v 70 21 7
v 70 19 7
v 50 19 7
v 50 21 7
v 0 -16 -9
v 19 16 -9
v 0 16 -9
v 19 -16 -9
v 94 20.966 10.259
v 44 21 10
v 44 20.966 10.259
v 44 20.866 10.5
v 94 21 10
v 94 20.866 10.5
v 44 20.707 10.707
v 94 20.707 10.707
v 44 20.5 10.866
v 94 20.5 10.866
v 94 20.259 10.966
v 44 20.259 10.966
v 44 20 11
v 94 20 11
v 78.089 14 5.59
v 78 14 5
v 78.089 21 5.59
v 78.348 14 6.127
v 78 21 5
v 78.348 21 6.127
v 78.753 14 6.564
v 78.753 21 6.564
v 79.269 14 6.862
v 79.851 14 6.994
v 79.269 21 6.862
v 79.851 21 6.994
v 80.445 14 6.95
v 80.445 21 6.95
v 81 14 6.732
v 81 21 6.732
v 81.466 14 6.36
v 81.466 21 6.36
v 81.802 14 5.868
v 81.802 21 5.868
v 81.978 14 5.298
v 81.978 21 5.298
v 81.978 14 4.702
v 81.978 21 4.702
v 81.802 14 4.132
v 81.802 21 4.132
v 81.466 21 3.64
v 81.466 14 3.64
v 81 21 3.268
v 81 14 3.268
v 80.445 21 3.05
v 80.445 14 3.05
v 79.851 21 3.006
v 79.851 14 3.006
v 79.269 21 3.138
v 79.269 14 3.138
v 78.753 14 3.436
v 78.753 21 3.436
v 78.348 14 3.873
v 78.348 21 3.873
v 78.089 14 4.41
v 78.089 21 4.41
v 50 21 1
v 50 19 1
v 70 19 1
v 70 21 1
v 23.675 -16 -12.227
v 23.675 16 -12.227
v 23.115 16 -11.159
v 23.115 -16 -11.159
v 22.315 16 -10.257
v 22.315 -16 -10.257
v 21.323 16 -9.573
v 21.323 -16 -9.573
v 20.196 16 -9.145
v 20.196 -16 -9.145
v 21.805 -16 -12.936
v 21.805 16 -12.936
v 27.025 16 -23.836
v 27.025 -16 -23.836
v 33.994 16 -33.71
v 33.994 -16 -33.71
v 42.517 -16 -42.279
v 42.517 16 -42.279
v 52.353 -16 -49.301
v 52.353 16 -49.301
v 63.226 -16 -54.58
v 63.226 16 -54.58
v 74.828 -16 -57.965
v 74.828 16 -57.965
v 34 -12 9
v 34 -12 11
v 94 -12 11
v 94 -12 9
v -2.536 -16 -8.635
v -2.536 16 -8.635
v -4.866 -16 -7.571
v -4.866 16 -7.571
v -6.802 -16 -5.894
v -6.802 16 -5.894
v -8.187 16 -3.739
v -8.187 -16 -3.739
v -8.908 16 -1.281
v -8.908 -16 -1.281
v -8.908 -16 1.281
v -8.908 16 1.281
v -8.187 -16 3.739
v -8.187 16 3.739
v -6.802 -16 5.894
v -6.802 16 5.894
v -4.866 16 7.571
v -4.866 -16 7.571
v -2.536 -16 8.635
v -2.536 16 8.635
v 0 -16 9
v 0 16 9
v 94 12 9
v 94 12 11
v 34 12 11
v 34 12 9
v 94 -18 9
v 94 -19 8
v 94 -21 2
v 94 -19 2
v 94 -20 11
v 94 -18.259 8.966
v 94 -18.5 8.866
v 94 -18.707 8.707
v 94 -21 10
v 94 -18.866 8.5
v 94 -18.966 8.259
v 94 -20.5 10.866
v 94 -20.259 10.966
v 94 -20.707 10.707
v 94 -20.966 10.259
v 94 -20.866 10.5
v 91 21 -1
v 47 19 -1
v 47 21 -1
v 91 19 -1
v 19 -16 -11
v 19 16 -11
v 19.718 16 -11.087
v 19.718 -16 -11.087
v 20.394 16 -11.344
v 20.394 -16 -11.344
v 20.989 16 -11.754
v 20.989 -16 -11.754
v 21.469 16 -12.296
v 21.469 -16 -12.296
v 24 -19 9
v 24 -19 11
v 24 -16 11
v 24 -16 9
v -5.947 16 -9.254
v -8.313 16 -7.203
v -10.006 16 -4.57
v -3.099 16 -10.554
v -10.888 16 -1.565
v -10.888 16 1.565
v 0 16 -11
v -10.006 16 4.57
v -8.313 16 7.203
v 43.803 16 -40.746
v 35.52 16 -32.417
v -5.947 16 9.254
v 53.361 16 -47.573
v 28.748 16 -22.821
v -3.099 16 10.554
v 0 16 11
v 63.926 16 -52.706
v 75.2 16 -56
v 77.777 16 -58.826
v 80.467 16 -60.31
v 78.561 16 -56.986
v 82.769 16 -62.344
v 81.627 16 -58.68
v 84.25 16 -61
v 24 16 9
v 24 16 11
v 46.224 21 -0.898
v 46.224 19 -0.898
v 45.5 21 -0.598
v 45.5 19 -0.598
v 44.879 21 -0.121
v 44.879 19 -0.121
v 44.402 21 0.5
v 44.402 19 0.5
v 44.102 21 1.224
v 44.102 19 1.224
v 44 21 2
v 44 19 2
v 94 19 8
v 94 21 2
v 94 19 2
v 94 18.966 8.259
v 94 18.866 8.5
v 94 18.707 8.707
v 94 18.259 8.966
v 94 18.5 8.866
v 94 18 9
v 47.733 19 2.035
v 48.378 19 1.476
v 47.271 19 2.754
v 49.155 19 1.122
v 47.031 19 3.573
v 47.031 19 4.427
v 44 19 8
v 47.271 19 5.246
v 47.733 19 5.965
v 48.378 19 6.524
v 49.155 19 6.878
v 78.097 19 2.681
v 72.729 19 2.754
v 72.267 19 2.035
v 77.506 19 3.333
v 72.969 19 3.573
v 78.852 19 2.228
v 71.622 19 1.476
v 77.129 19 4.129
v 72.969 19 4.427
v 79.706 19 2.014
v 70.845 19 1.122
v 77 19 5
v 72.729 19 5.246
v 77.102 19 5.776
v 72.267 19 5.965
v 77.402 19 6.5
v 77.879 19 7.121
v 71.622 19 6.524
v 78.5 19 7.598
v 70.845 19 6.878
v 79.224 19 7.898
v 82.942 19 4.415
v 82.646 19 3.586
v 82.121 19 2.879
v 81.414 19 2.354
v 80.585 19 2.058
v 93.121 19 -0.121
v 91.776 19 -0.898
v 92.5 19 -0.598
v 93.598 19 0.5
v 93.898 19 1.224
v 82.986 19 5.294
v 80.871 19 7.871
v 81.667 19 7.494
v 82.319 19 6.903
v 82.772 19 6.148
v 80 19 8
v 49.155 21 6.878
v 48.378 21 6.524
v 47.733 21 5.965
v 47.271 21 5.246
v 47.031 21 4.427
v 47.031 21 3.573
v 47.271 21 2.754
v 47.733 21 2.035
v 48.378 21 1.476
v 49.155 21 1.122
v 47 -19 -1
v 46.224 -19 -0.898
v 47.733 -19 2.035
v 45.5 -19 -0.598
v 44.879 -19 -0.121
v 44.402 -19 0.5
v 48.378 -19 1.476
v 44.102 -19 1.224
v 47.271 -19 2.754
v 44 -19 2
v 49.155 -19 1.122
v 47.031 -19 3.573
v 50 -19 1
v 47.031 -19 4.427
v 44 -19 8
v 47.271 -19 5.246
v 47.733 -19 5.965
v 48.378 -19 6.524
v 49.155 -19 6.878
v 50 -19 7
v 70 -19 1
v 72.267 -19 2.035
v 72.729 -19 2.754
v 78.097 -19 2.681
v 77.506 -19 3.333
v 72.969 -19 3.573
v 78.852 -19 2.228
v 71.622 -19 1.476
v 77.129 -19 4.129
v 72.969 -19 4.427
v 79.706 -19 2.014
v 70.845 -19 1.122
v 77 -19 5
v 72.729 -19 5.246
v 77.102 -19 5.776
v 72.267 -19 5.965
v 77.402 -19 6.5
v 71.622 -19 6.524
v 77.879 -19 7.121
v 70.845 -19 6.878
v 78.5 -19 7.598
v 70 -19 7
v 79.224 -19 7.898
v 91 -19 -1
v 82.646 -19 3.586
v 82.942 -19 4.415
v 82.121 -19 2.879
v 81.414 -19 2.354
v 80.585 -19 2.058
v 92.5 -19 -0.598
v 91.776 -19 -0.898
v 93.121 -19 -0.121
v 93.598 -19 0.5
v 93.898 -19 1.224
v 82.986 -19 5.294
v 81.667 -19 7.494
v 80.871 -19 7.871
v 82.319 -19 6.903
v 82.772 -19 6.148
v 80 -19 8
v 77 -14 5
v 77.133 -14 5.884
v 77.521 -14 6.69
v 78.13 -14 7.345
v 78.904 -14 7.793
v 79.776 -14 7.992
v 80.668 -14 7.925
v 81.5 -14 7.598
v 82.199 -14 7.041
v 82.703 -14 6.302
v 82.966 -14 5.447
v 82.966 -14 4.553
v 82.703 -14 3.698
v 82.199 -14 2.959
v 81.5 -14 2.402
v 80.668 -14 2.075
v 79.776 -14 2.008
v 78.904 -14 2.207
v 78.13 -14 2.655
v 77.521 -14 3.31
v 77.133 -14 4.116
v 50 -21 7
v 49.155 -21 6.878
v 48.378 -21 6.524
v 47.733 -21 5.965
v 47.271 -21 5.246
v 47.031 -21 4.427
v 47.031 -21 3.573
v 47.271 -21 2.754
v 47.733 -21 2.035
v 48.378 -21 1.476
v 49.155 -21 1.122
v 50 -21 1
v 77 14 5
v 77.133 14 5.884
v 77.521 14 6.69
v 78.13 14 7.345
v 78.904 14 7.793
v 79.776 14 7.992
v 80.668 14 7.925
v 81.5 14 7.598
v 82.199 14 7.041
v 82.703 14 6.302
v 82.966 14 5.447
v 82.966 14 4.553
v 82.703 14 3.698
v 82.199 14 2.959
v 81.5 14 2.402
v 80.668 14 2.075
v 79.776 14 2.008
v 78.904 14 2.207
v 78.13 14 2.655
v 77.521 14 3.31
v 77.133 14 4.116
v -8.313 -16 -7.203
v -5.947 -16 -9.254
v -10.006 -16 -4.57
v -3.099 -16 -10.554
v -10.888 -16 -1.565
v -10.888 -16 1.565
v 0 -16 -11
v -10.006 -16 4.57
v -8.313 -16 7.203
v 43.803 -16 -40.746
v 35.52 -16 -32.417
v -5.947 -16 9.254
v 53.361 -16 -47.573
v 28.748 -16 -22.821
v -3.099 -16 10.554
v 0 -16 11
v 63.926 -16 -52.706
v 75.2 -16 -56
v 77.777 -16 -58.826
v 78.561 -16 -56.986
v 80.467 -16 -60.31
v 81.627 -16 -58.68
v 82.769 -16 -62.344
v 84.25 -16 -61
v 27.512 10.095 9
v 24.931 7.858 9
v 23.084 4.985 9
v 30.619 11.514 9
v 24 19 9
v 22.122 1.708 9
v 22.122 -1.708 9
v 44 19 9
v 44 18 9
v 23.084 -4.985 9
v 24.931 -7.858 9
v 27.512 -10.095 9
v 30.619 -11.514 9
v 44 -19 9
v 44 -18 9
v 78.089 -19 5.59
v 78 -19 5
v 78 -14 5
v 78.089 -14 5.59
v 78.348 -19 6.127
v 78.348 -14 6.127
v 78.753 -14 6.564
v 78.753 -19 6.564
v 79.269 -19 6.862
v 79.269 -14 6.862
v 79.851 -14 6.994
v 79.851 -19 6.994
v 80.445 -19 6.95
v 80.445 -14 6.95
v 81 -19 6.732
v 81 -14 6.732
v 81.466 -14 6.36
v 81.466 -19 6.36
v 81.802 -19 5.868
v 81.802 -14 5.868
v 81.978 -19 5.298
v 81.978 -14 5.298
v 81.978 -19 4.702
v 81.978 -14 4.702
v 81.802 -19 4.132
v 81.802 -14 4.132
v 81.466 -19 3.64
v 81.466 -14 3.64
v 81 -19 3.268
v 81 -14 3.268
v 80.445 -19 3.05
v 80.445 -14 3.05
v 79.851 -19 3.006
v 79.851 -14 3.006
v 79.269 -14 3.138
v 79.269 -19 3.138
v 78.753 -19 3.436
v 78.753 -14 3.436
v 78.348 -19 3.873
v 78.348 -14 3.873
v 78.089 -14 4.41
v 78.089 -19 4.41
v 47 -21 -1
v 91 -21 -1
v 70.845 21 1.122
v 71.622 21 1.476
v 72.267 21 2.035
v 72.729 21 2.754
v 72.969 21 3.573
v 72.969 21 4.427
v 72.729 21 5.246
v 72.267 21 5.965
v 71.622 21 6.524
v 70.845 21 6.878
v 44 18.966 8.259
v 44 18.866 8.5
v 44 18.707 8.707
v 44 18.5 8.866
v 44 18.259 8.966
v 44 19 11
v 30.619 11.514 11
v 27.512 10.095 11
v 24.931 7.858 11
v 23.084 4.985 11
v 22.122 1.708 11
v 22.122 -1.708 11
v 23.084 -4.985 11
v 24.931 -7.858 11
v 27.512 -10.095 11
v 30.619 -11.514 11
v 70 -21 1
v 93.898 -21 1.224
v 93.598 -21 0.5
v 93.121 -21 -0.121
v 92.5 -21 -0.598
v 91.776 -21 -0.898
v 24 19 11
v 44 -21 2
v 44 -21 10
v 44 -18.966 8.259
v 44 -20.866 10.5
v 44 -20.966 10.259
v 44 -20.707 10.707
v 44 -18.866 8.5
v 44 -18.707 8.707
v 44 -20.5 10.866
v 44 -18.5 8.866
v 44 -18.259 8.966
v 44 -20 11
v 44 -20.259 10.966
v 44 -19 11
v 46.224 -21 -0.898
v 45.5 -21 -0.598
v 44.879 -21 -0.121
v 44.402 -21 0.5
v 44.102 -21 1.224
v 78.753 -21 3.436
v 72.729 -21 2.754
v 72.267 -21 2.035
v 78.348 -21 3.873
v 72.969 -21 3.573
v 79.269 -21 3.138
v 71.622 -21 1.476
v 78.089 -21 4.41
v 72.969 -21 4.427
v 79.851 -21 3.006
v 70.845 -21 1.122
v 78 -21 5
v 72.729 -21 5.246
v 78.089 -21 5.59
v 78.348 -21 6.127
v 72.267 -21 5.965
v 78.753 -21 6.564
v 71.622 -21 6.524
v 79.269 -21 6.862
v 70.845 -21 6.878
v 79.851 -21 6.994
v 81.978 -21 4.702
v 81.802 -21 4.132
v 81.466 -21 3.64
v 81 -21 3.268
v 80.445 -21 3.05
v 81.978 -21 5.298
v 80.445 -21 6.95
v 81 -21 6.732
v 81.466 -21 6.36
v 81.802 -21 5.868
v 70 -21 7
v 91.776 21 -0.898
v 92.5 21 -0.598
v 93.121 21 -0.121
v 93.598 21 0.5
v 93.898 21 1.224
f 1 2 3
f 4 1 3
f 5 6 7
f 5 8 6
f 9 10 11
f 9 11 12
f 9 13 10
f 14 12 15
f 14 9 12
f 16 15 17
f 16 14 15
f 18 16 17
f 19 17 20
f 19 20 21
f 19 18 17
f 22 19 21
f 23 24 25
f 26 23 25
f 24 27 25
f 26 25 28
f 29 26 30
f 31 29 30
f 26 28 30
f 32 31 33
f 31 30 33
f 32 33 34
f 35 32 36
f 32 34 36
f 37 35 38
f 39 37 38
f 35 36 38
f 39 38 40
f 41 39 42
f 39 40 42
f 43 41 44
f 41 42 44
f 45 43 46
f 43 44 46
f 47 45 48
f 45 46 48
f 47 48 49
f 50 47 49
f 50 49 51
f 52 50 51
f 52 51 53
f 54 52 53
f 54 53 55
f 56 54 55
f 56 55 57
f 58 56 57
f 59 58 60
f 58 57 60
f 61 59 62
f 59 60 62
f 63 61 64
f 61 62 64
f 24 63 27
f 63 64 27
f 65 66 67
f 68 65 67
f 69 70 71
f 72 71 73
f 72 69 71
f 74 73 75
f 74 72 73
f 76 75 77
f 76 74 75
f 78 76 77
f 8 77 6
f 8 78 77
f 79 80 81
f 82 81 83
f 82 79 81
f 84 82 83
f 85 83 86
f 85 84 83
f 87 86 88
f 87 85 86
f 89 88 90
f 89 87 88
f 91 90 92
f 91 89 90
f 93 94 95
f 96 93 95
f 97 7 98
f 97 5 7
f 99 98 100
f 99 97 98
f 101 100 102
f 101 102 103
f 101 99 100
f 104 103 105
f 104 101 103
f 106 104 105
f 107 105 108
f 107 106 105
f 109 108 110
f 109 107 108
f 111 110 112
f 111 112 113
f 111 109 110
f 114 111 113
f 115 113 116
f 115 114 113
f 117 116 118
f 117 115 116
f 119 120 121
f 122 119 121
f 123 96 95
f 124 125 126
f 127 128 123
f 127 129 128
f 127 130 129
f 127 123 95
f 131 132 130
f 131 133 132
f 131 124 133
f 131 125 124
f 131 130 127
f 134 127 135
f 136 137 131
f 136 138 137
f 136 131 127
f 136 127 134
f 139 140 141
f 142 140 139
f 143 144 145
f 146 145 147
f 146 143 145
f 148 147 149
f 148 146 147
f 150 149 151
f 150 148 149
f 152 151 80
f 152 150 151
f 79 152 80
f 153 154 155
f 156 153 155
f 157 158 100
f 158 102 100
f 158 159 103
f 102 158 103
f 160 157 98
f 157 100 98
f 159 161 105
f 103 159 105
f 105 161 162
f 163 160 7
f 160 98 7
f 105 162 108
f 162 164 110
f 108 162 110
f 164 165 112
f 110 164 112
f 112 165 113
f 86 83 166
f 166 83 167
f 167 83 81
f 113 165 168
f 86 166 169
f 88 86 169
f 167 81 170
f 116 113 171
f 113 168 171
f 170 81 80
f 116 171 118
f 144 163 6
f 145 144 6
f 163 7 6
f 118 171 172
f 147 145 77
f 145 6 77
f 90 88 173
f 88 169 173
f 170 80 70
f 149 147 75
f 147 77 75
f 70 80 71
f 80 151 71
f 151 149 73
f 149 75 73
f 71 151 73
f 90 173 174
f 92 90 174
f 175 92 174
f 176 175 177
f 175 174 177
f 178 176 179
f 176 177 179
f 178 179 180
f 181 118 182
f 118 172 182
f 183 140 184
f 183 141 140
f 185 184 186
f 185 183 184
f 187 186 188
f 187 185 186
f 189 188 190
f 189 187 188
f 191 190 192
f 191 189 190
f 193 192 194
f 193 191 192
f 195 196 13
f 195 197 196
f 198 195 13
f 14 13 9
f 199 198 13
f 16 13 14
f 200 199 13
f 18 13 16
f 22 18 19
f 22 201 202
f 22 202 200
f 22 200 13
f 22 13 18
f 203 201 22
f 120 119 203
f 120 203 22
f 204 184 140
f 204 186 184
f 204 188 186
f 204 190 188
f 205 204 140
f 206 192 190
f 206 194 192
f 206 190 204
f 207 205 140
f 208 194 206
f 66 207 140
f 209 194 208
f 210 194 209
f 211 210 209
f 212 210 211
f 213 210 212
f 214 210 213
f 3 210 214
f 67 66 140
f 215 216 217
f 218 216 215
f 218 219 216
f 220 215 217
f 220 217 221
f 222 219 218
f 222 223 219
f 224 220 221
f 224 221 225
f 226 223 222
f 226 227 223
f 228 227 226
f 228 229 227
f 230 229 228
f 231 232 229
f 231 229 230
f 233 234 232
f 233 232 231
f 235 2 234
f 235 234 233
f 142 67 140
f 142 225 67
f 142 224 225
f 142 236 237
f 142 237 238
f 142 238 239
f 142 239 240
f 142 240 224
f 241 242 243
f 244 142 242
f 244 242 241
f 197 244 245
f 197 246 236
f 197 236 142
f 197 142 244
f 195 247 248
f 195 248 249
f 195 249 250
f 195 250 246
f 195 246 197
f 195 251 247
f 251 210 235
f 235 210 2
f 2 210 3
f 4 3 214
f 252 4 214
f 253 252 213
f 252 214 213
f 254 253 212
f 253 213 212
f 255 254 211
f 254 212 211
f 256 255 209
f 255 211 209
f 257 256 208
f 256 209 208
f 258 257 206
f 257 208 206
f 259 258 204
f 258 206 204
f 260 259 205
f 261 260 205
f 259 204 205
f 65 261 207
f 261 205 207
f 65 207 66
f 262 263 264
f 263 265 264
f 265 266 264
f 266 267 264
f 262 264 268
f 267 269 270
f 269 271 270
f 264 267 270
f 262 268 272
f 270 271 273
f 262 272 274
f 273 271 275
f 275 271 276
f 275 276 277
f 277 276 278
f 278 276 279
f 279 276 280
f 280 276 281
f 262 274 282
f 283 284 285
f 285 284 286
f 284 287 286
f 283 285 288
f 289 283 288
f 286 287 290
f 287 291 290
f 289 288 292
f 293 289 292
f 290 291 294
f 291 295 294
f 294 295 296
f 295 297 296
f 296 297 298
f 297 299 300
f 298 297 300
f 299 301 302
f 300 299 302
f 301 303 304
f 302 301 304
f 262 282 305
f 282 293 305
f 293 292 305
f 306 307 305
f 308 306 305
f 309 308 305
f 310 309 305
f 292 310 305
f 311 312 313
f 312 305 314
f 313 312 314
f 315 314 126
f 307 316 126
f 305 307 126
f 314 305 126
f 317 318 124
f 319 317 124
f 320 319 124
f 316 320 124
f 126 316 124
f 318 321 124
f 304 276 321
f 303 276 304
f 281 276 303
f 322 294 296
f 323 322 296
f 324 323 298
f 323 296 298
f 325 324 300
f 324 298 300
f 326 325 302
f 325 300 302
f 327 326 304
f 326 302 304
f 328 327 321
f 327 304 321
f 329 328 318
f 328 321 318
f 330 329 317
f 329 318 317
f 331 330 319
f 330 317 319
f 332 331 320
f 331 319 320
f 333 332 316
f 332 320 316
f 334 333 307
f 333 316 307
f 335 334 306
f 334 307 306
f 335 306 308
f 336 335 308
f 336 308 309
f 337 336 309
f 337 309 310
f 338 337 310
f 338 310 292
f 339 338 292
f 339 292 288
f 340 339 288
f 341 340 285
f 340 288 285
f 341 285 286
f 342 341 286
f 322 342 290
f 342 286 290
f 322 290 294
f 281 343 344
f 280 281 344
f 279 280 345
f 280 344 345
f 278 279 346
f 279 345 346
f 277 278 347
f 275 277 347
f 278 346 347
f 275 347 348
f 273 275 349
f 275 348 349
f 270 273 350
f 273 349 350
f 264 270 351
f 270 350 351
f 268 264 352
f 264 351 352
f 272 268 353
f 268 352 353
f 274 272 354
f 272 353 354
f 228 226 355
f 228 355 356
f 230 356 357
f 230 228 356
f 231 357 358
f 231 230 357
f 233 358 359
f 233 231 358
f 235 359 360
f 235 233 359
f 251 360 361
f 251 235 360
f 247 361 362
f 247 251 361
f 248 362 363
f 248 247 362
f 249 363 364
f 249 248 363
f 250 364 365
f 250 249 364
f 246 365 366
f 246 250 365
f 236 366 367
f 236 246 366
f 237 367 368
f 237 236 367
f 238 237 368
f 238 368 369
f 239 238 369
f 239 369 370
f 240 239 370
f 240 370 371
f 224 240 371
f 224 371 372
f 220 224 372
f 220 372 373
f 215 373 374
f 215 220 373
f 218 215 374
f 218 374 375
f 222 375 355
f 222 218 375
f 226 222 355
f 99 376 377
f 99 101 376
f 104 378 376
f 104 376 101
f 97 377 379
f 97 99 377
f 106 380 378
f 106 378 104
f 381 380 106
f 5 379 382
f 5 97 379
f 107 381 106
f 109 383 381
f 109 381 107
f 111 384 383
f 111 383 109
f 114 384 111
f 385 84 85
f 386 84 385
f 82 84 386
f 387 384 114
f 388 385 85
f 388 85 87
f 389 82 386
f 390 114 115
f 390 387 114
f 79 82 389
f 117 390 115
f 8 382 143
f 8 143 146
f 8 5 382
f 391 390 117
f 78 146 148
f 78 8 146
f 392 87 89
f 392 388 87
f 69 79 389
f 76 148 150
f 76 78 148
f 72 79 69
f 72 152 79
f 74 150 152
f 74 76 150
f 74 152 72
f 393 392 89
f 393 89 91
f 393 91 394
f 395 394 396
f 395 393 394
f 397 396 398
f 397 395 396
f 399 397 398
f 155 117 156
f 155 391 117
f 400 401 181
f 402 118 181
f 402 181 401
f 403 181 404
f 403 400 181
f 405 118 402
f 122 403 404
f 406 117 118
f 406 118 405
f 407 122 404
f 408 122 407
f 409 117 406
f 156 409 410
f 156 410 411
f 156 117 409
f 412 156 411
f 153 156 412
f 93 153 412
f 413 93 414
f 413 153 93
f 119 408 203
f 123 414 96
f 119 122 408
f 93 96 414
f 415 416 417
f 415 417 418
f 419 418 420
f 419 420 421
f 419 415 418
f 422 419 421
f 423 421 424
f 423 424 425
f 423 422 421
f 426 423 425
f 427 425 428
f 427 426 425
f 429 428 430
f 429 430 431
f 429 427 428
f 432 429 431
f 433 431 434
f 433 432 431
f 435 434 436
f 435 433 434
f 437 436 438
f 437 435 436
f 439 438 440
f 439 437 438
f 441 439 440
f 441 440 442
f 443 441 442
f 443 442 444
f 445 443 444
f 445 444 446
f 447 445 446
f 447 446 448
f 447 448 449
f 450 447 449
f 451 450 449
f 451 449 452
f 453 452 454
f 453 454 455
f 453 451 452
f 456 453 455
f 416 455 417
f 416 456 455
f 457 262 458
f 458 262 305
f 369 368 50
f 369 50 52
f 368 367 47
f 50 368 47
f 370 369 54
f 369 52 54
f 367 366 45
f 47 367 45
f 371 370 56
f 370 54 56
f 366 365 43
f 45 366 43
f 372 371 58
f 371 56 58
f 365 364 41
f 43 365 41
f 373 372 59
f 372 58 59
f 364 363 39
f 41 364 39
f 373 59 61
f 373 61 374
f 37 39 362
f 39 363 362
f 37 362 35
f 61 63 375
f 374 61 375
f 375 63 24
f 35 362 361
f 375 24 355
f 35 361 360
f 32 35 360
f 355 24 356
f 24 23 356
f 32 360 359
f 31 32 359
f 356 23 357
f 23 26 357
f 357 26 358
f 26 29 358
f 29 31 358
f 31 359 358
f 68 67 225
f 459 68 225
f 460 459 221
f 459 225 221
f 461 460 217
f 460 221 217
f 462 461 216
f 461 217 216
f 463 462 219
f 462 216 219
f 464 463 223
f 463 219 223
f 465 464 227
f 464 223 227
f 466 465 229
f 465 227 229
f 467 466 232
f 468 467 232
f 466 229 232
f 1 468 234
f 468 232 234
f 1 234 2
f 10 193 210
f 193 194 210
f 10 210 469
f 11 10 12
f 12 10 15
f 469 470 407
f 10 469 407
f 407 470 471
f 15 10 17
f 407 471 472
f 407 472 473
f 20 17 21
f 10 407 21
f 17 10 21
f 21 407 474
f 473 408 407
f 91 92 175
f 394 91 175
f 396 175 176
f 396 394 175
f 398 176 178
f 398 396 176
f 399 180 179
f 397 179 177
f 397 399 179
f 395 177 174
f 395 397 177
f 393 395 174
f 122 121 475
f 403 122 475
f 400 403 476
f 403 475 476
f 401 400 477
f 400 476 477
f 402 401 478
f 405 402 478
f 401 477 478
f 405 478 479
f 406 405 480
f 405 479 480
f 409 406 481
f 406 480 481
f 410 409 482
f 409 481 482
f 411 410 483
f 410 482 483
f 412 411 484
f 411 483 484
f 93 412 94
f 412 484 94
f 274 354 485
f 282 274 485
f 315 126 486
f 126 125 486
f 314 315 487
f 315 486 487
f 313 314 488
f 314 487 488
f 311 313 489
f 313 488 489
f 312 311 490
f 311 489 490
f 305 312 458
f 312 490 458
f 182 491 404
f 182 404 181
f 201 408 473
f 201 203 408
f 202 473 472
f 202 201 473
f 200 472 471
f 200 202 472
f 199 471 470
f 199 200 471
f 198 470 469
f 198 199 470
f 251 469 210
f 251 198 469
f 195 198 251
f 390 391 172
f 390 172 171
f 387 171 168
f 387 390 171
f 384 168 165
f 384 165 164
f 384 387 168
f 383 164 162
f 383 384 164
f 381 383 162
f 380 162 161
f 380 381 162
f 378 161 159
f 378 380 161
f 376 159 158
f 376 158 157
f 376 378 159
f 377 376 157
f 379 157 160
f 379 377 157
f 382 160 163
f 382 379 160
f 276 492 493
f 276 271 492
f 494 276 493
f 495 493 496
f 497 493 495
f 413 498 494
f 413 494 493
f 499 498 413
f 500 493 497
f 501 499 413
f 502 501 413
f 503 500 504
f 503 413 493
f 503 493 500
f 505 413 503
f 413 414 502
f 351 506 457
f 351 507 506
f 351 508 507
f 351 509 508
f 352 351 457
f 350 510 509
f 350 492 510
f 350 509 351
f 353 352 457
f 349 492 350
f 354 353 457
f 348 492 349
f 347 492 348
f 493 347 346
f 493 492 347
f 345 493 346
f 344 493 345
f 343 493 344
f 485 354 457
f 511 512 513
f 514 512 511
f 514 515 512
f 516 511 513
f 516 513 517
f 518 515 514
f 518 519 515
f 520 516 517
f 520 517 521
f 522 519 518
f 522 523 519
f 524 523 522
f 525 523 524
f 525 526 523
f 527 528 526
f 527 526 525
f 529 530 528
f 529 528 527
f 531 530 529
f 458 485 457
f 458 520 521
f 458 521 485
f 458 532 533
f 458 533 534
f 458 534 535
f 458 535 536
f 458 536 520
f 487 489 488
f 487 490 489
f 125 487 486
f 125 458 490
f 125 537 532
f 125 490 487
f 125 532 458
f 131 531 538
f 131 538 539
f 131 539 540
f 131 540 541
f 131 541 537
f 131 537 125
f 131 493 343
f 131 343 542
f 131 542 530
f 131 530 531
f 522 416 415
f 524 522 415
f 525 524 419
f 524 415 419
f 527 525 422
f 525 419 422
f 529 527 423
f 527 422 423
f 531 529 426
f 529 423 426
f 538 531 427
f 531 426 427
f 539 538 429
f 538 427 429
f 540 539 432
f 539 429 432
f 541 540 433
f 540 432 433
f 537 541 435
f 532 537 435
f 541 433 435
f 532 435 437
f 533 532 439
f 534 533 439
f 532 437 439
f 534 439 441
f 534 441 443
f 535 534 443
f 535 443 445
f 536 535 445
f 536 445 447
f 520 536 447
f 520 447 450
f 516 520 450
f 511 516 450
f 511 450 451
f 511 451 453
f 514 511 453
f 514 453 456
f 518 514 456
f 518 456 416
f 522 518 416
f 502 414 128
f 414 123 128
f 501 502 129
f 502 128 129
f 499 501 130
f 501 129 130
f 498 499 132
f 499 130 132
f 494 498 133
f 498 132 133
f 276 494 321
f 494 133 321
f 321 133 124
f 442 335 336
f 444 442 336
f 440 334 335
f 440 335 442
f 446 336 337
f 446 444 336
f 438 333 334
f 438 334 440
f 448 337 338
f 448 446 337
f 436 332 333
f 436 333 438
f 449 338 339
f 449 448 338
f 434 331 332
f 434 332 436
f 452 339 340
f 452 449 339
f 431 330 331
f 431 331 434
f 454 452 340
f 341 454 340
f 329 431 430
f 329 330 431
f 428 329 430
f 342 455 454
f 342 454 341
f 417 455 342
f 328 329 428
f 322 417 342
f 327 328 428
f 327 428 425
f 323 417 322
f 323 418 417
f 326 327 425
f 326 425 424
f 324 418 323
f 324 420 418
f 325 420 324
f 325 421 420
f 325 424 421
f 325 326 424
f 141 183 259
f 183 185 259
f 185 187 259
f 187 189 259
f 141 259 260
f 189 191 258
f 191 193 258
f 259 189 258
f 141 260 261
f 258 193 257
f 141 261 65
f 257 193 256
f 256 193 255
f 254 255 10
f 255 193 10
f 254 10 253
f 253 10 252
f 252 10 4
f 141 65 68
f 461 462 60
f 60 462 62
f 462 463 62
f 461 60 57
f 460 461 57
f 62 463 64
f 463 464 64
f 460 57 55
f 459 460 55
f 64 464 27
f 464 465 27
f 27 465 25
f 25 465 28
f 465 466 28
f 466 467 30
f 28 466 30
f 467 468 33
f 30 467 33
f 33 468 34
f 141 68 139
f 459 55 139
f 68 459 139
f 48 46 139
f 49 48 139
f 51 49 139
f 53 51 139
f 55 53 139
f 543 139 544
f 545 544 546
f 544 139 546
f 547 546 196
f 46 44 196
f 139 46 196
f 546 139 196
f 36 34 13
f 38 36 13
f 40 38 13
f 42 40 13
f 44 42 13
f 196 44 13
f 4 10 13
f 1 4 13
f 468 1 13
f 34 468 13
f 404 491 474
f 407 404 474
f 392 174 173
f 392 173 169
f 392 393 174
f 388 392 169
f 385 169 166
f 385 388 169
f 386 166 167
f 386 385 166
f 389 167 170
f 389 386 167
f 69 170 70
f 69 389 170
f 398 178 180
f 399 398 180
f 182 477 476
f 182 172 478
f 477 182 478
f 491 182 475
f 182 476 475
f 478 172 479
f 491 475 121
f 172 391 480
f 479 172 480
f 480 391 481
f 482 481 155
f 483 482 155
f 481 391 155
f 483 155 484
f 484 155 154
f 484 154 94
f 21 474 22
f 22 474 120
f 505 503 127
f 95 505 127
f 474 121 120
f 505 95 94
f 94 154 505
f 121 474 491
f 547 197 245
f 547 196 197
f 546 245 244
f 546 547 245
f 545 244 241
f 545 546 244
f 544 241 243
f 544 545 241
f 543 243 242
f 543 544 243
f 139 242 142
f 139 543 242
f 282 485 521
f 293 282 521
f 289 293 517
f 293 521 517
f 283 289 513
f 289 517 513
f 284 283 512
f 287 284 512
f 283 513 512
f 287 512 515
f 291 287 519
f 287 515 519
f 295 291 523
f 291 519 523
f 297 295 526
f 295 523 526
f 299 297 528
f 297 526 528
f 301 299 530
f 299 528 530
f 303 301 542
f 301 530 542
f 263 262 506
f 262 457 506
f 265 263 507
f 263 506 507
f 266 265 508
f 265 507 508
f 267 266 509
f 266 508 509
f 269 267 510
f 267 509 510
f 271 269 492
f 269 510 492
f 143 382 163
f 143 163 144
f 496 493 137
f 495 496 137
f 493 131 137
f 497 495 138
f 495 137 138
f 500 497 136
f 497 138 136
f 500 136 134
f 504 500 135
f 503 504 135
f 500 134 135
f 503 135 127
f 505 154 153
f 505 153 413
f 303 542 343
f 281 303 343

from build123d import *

# Parameters (mm, degrees)
F1_DEPTH  = 16
F2_W      = 70
F2_H      = 3
F3_DEPTH  = 2
F4_W      = 50
F4_H      = 12
F5_DEPTH  = 2
F6_R      = 1
F9_DEPTH  = 2
F11_DEPTH = 42.001
F13_D     = 4
F14_R     = 3
F14_R_2   = 2
F15_DEPTH = 5
F16_R     = 3


# Not quite as in the source:
# - a pattern or mirror of a feature is missing from the dataset's text; its kind, count and spacing are read off the source's solid


with BuildPart() as f1:
    # F0 (on Front) → F1 (new body)
    with BuildSketch(Plane.XZ):
        with BuildLine():
            ThreePointArc((0, -9), (-9, 0), (0, 9))
            Line((0, 9), (94, 9))
            Line((94, 9), (94, 11))
            Line((94, 11), (0, 11))
            ThreePointArc((0, 11), (-11, 0), (0, -11))
            Line((0, -11), (19, -11))
            ThreePointArc((19, -11), (20.704090422, -11.530976745), (21.8049592536, -12.9359494441))
            ThreePointArc((21.8049592536, -12.9359494441), (42.5173607247, -42.2788136793), (74.8275397389, -57.9651003113))
            ThreePointArc((74.8275397389, -57.9651003113), (79.1628330842, -59.4937576212), (82.7692987656, -62.344190369))
            Line((82.7692987656, -62.344190369), (84.2502282886, -61))
            ThreePointArc((84.2502282886, -61), (80.1403113626, -57.7488524545), (75.200382963, -56))
            ThreePointArc((75.200382963, -56), (43.8025480023, -40.74634786), (23.6749320894, -12.2265824069))
            ThreePointArc((23.6749320894, -12.2265824069), (21.8401507033, -9.8849612416), (19, -9))
            Line((19, -9), (0, -9))
        make_face()
    extrude(amount=F1_DEPTH)

    # F2 (on face) → F3 (join)
    with BuildSketch(Plane.XY.offset(11)):
        with Locations((59, -17.5)):
            Rectangle(F2_W, F2_H)
    extrude(amount=-F3_DEPTH)

    # F4 (on face) → F5 (join)
    with BuildSketch(Plane.XZ.offset(19)):
        with Locations((69, 5)):
            Rectangle(F4_W, F4_H)
    extrude(amount=F5_DEPTH)

    # F6
    f6_edges = [f1.edges().sort_by_distance(p)[0] for p in [
        (69, -21, 11),
        (69, -19, 9),
    ]]
    fillet(f6_edges, radius=F6_R)

    # F7: F1 across plane


with BuildPart() as f1_1:
    add(f1.part)
    add(f1.part.mirror(Plane.XZ))

    # F8 (on face) → F9 (cut)
    with BuildSketch(Plane.XY.offset(11)):
        with BuildLine():
            Line((94, 12), (34, 12))
            ThreePointArc((34, 12), (22, 0), (34, -12))
            Line((34, -12), (94, -12))
            Line((94, -12), (94, 12))
        make_face()
    extrude(amount=-F9_DEPTH, mode=Mode.SUBTRACT)

    # F10 (on face) → F11 (cut, through all)
    with BuildSketch(Plane.XZ.offset(21)):
        with BuildLine():
            ThreePointArc((50, 7), (47, 4), (50, 1))
            Line((50, 1), (70, 1))
            ThreePointArc((70, 1), (73, 4), (70, 7))
            Line((70, 7), (50, 7))
        make_face()
    extrude(amount=-F11_DEPTH, mode=Mode.SUBTRACT)

    # F13 (through all)
    with Locations(Plane.XZ.offset(21)):
        with Locations((80, 5)):
            Hole(F13_D / 2)

    # F14 (on face) → F15 (join)
    with BuildSketch(Plane(origin=(0, -19, 0), x_dir=(-1, 0, 0), z_dir=(0, 1, 0))):
        with Locations((-80, 5)):
            Circle(F14_R)
        with Locations((-80, 5)):
            Circle(F14_R_2, mode=Mode.SUBTRACT)
    f15 = extrude(amount=F15_DEPTH)

    # F15_copies: F15 across plane
    add(f15.mirror(Plane.ZX))

    # F16
    f16_edges = [f1_1.edges().sort_by_distance(p)[0] for p in [
        (94, -20, -1),
        (94, 20, -1),
        (44, 20, -1),
        (44, -20, -1),
    ]]
    fillet(f16_edges, radius=F16_R)


solid = f1_1.part
